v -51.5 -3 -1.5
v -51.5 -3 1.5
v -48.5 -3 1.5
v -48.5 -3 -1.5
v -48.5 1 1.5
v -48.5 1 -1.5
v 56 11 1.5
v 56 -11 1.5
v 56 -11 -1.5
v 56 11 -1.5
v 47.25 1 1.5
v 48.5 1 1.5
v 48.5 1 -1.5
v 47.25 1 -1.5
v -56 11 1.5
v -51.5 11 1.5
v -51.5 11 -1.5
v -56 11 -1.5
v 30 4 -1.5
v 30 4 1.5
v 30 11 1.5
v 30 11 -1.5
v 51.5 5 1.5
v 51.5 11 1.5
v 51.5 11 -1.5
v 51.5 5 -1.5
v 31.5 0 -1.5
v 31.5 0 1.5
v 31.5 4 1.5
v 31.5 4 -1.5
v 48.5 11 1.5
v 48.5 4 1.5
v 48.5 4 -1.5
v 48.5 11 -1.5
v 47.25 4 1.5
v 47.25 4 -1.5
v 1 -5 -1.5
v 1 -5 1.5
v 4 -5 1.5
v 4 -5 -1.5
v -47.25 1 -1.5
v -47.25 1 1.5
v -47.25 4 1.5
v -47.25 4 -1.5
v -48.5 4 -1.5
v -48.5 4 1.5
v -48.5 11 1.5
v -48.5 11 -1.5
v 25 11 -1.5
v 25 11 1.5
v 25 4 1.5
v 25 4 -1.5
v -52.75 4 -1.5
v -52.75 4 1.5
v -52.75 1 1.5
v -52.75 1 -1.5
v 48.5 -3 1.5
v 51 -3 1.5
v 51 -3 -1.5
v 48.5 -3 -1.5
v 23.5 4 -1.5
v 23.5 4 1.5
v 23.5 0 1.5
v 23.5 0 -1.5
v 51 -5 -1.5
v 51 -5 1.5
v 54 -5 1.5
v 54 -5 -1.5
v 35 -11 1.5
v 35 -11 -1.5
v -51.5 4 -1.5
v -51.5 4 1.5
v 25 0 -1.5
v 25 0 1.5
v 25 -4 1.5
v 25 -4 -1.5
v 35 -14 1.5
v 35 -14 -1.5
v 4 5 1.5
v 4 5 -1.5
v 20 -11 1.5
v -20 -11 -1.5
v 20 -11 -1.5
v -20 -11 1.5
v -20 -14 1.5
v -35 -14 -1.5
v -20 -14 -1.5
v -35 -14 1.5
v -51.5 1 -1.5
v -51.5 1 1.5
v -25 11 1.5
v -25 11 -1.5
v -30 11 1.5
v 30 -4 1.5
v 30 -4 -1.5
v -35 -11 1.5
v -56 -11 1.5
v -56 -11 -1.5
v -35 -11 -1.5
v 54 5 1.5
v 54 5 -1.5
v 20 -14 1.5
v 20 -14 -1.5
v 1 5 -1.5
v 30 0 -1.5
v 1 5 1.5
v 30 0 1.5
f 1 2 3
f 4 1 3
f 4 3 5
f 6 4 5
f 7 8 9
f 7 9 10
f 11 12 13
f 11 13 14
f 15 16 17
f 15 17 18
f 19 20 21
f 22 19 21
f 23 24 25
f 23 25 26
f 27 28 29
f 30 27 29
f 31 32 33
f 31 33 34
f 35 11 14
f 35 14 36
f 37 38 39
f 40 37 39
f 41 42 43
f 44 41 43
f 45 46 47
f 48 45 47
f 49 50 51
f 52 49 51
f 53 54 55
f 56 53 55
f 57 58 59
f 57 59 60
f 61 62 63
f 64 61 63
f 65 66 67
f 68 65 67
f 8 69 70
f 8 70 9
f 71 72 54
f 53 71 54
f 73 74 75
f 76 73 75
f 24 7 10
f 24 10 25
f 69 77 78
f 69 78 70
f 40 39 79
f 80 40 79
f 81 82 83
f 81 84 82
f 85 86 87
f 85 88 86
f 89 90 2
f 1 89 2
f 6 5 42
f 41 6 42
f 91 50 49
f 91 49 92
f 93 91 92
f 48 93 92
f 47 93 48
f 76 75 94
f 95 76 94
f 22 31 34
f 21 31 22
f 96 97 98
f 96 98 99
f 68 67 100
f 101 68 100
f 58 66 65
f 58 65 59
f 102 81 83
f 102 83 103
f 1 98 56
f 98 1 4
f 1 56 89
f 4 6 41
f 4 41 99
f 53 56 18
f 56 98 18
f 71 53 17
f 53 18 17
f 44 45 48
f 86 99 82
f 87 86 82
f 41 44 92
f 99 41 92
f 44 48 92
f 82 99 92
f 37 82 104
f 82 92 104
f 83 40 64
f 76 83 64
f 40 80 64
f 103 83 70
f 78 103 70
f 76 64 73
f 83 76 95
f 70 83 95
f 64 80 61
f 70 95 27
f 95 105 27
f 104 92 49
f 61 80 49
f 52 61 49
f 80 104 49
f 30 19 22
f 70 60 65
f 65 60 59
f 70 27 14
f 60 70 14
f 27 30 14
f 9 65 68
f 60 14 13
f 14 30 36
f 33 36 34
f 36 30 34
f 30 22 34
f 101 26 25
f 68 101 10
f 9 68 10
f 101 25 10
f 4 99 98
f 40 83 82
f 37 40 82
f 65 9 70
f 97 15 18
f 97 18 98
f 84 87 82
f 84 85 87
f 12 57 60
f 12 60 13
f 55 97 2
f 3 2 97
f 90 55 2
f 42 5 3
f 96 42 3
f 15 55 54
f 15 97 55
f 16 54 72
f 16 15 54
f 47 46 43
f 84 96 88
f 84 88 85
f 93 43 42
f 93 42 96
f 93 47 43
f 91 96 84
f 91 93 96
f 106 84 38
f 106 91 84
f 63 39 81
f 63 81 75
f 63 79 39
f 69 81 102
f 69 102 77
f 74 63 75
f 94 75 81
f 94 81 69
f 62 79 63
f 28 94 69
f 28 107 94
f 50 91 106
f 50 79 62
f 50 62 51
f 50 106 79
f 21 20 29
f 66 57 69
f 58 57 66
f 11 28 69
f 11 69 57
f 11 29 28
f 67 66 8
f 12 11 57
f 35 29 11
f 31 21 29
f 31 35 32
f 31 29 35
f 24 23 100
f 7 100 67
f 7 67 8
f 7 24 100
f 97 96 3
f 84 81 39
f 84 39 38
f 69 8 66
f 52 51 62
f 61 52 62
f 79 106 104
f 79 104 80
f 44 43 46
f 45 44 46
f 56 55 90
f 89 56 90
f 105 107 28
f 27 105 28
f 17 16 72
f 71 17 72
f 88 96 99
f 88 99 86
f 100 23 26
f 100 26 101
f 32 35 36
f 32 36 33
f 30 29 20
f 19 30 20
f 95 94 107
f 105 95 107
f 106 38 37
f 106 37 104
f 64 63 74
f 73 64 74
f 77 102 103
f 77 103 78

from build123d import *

# Parameters (mm, degrees)
BOSS_EXTRUDE1_DEPTH = 1.5
SKETCH2_W           = 3
SKETCH2_H           = 10
CUT_EXTRUDE1_DEPTH  = 58.801384066
CUT_EXTRUDE3_DEPTH  = 58.801384066
CUT_EXTRUDE4_DEPTH  = 58.801384066
SKETCH6_W           = 18.566482568
SKETCH6_H           = 17.933193013
BOSS_EXTRUDE3_DEPTH = 3


with BuildPart() as part:
    # Sketch1 → Boss-Extrude1 (new, symmetric)
    with BuildSketch(Plane.XY):
        Polygon((-20, -11), (20, -11), (20, -14), (35, -14), (35, -11), (56, -11), (56, 11), (-56, 11), (-56, -11), (-35, -11), (-35, -14), (-20, -14), align=None)
    extrude(amount=BOSS_EXTRUDE1_DEPTH, both=True)

    # Sketch2 → Cut-Extrude1 (cut, through all)
    with BuildSketch(Plane.XY.offset(1.5)):
        with Locations((2.5, 0)):
            Rectangle(SKETCH2_W, SKETCH2_H)
        with Locations((52.5, 0)):
            Rectangle(SKETCH2_W, SKETCH2_H)
    extrude(amount=-CUT_EXTRUDE1_DEPTH, mode=Mode.SUBTRACT)

    # Sketch4 → Cut-Extrude3 (cut, through all)
    with BuildSketch(Plane.XY.offset(1.5)):
        Polygon((25, 11), (25, 4), (23.5, 4), (23.5, 0), (25, 0), (25, -4), (30, -4), (30, 0), (31.5, 0), (31.5, 4), (30, 4), (30, 11), align=None)
        Polygon((-30, 11), (-25, 11), (-25, 4), (-23.5, 4), (-23.5, 0), (-25, 0), (-25, -4), (-30, -4), (-30, 0), (-31.5, 0), (-31.5, 4), (-30, 4), align=None)
    extrude(amount=-CUT_EXTRUDE3_DEPTH, mode=Mode.SUBTRACT)

    # Sketch5 → Cut-Extrude4 (cut, through all)
    with BuildSketch(Plane.XY.offset(1.5)):
        Polygon((-51.5, 11), (-51.5, 4), (-52.75, 4), (-52.75, 1), (-51.5, 1), (-51.5, -3), (-48.5, -3), (-48.5, 1), (-47.25, 1), (-47.25, 4), (-48.5, 4), (-48.5, 11), align=None)
        Polygon((48.5, 11), (51.5, 11), (51.5, 4), (52.75, 4), (52.75, 1), (51.5, 1), (51.5, -3), (48.5, -3), (48.5, 1), (47.25, 1), (47.25, 4), (48.5, 4), align=None)
    extrude(amount=-CUT_EXTRUDE4_DEPTH, mode=Mode.SUBTRACT)

    # Sketch6 → Boss-Extrude3 (add, through all)
    with BuildSketch(Plane.XY.offset(1.5)):
        with Locations((-26.473921785, 2.033403493)):
            Rectangle(SKETCH6_W, SKETCH6_H)
    extrude(amount=-BOSS_EXTRUDE3_DEPTH)


solid = part.part
